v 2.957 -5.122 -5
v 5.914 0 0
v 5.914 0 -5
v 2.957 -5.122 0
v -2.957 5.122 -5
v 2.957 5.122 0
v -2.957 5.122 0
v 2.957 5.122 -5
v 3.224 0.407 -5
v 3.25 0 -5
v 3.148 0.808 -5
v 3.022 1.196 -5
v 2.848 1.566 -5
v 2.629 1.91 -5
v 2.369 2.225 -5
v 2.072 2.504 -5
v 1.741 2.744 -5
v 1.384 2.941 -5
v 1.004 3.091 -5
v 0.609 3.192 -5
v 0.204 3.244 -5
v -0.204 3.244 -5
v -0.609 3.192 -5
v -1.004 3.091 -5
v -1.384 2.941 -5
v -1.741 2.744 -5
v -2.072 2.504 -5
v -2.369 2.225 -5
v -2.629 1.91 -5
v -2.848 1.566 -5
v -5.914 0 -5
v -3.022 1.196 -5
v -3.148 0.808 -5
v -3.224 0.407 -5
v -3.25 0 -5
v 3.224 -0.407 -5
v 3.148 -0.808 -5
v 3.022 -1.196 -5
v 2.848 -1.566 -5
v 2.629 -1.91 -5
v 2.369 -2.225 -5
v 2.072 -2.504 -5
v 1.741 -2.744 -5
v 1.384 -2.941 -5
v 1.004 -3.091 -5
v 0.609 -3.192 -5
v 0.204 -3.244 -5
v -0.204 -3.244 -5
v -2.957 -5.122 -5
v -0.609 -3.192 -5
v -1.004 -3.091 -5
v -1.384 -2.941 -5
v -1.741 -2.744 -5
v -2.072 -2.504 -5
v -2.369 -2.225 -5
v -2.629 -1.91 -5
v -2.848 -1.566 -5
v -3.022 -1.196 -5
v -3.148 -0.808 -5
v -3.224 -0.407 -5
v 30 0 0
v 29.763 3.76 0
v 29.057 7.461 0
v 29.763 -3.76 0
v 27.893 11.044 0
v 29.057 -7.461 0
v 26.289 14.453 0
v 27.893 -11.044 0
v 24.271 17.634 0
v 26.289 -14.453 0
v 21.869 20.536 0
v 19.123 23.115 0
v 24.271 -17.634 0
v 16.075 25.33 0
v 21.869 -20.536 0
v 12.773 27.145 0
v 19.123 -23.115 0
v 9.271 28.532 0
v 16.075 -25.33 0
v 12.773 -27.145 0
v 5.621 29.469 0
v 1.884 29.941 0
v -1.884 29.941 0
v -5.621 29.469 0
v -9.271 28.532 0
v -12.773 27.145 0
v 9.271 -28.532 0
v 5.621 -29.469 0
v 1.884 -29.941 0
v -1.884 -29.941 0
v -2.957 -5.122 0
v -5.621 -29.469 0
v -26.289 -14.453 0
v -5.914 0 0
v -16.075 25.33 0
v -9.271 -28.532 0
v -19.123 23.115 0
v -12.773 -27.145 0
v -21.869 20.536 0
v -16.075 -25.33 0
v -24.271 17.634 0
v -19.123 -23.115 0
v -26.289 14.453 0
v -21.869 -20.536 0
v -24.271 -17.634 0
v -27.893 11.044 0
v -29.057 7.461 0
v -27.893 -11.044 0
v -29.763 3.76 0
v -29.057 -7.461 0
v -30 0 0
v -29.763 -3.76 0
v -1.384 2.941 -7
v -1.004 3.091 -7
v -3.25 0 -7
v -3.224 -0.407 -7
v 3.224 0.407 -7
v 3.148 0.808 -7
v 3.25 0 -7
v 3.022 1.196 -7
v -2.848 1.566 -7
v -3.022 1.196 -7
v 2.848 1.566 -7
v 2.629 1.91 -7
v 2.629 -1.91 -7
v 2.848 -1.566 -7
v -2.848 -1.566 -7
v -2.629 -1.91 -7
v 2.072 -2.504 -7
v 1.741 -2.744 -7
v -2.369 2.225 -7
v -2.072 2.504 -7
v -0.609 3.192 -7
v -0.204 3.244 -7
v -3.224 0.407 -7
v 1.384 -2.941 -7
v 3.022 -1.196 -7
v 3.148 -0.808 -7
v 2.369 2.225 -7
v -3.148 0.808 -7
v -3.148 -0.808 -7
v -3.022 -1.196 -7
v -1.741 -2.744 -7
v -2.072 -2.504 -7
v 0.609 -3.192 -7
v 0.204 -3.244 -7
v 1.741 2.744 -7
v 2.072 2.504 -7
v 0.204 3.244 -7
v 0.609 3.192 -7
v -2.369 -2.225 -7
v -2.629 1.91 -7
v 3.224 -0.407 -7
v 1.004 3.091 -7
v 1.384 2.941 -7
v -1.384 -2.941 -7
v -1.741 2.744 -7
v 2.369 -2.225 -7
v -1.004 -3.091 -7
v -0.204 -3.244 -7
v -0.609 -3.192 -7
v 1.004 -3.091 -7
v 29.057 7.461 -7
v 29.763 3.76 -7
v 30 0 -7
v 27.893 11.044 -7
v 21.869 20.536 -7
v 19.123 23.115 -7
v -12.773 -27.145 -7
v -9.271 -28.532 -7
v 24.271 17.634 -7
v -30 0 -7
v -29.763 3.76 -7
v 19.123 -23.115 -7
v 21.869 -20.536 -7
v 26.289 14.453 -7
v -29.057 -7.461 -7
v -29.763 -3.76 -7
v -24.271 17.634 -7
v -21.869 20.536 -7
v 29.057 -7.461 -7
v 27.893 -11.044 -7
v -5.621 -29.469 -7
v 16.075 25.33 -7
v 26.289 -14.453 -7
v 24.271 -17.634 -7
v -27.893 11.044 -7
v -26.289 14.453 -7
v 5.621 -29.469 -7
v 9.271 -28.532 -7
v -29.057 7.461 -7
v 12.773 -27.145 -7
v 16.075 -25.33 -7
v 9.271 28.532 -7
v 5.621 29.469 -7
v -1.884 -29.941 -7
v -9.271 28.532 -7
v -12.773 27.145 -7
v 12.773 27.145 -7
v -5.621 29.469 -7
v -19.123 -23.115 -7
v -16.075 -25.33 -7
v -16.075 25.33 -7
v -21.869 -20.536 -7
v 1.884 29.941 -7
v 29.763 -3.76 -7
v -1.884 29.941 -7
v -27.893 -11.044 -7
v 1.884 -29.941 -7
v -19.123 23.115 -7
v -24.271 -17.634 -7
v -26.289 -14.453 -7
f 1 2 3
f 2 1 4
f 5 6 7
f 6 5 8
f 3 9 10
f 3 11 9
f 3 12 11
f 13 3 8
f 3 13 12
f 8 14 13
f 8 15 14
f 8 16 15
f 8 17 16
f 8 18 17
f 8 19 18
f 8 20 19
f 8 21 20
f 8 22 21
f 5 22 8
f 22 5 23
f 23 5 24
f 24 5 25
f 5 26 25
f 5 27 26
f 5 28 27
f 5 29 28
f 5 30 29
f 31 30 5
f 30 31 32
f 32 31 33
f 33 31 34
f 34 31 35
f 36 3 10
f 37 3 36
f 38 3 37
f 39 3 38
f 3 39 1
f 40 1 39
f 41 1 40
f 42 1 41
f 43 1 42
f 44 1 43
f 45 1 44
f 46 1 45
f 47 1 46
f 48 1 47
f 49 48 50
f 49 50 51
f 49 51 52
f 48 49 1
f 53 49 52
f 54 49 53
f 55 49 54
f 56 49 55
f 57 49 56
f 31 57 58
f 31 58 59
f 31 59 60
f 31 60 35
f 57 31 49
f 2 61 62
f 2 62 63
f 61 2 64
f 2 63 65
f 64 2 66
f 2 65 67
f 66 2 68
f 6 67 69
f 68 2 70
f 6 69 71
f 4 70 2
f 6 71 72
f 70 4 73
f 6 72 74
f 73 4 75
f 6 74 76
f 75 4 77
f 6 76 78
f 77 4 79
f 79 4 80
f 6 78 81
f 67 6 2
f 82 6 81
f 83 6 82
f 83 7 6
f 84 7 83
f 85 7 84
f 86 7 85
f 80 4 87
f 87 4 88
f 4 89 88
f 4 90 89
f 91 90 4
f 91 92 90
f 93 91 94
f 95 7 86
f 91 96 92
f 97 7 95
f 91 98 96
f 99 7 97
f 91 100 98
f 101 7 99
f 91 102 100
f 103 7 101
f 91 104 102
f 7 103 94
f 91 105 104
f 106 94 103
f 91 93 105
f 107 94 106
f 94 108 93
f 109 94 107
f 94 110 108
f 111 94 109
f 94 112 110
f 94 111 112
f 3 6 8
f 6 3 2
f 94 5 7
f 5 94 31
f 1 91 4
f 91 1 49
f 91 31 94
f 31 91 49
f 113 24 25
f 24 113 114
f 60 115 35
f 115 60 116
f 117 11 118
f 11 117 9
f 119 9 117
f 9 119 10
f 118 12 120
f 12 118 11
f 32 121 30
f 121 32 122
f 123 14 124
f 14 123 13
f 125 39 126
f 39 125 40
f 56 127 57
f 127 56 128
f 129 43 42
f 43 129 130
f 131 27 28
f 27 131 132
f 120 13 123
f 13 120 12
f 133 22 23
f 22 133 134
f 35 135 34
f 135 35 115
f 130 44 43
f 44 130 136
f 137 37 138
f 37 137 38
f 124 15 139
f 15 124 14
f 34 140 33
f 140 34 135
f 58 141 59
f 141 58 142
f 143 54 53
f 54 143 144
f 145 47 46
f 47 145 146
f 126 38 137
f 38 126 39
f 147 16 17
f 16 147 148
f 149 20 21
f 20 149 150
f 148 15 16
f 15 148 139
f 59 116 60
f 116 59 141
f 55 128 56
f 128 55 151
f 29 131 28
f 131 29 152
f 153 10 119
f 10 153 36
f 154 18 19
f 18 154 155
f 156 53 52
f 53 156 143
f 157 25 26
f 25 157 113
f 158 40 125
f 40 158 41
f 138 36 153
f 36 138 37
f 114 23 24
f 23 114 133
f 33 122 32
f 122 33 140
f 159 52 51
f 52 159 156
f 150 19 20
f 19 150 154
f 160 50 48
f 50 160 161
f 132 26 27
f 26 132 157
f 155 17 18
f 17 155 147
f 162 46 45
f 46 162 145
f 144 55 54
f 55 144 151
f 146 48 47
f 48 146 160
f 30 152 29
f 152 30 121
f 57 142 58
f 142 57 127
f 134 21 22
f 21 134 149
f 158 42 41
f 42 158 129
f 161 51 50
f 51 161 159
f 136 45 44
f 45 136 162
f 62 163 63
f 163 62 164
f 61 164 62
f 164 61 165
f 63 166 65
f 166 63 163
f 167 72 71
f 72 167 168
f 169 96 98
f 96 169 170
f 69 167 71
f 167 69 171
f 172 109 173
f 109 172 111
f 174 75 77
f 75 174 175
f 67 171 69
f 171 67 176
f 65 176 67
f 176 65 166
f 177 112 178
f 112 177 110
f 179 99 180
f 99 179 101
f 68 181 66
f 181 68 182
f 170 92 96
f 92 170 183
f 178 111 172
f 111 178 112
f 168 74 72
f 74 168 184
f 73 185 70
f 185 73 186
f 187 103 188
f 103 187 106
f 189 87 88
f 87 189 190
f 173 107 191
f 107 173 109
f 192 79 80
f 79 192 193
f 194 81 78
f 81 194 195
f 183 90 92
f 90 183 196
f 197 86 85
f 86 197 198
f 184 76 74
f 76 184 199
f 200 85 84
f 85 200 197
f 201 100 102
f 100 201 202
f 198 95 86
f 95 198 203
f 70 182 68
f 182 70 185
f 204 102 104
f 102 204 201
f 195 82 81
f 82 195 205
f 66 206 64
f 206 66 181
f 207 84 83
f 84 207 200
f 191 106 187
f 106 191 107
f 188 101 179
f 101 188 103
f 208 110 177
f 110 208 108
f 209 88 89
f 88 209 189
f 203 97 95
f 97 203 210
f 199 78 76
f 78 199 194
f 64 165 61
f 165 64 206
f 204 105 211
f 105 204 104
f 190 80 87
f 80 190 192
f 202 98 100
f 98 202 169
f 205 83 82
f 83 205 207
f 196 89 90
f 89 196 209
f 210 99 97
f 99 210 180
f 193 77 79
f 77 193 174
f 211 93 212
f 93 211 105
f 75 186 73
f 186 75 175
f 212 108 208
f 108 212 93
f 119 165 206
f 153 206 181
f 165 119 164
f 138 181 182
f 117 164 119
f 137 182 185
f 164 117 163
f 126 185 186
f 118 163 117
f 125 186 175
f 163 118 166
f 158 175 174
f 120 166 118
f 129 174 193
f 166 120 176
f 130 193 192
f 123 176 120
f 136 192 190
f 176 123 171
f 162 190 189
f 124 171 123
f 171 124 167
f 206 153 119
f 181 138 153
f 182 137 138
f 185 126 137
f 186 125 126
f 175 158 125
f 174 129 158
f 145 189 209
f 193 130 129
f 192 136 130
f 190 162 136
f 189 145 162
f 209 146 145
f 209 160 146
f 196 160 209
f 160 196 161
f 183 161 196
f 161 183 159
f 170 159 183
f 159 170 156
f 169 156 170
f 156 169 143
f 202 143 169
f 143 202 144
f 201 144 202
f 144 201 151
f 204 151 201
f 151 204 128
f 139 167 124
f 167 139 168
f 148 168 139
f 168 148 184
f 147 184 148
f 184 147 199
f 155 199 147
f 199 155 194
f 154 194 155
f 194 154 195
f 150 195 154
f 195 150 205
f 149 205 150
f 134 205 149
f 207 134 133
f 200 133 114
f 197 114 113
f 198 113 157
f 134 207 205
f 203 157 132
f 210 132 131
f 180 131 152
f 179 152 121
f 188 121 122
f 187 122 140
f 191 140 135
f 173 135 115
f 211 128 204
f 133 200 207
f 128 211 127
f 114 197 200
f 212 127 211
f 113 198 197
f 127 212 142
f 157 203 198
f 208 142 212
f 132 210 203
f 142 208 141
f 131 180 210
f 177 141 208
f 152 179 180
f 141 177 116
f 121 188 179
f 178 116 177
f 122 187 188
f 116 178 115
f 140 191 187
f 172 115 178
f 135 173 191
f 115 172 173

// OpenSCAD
$fn = 50;


difference() {
	union() {
		translate(v = [0, 0, -7.0000000000]) {
			cylinder(h = 7.0000000000, r = 30.0000000000);
		}
	}
	union() {
		translate(v = [0, 0, 0]) {
			rotate(a = [0, 0, 0]) {
				difference() {
					union() {
						translate(v = [0, 0, -5]) {
							linear_extrude(height = 5) {
								polygon(points = [[5.9142500000, 0.0000000000], [2.9571250000, 5.1218907443], [-2.9571250000, 5.1218907443], [-5.9142500000, 0.0000000000], [-2.9571250000, -5.1218907443], [2.9571250000, -5.1218907443]]);
							}
						}
					}
					union();
				}
			}
		}
		#translate(v = [0, 0, -100.0000000000]) {
			cylinder(h = 200, r = 3.2500000000);
		}
	}
}
